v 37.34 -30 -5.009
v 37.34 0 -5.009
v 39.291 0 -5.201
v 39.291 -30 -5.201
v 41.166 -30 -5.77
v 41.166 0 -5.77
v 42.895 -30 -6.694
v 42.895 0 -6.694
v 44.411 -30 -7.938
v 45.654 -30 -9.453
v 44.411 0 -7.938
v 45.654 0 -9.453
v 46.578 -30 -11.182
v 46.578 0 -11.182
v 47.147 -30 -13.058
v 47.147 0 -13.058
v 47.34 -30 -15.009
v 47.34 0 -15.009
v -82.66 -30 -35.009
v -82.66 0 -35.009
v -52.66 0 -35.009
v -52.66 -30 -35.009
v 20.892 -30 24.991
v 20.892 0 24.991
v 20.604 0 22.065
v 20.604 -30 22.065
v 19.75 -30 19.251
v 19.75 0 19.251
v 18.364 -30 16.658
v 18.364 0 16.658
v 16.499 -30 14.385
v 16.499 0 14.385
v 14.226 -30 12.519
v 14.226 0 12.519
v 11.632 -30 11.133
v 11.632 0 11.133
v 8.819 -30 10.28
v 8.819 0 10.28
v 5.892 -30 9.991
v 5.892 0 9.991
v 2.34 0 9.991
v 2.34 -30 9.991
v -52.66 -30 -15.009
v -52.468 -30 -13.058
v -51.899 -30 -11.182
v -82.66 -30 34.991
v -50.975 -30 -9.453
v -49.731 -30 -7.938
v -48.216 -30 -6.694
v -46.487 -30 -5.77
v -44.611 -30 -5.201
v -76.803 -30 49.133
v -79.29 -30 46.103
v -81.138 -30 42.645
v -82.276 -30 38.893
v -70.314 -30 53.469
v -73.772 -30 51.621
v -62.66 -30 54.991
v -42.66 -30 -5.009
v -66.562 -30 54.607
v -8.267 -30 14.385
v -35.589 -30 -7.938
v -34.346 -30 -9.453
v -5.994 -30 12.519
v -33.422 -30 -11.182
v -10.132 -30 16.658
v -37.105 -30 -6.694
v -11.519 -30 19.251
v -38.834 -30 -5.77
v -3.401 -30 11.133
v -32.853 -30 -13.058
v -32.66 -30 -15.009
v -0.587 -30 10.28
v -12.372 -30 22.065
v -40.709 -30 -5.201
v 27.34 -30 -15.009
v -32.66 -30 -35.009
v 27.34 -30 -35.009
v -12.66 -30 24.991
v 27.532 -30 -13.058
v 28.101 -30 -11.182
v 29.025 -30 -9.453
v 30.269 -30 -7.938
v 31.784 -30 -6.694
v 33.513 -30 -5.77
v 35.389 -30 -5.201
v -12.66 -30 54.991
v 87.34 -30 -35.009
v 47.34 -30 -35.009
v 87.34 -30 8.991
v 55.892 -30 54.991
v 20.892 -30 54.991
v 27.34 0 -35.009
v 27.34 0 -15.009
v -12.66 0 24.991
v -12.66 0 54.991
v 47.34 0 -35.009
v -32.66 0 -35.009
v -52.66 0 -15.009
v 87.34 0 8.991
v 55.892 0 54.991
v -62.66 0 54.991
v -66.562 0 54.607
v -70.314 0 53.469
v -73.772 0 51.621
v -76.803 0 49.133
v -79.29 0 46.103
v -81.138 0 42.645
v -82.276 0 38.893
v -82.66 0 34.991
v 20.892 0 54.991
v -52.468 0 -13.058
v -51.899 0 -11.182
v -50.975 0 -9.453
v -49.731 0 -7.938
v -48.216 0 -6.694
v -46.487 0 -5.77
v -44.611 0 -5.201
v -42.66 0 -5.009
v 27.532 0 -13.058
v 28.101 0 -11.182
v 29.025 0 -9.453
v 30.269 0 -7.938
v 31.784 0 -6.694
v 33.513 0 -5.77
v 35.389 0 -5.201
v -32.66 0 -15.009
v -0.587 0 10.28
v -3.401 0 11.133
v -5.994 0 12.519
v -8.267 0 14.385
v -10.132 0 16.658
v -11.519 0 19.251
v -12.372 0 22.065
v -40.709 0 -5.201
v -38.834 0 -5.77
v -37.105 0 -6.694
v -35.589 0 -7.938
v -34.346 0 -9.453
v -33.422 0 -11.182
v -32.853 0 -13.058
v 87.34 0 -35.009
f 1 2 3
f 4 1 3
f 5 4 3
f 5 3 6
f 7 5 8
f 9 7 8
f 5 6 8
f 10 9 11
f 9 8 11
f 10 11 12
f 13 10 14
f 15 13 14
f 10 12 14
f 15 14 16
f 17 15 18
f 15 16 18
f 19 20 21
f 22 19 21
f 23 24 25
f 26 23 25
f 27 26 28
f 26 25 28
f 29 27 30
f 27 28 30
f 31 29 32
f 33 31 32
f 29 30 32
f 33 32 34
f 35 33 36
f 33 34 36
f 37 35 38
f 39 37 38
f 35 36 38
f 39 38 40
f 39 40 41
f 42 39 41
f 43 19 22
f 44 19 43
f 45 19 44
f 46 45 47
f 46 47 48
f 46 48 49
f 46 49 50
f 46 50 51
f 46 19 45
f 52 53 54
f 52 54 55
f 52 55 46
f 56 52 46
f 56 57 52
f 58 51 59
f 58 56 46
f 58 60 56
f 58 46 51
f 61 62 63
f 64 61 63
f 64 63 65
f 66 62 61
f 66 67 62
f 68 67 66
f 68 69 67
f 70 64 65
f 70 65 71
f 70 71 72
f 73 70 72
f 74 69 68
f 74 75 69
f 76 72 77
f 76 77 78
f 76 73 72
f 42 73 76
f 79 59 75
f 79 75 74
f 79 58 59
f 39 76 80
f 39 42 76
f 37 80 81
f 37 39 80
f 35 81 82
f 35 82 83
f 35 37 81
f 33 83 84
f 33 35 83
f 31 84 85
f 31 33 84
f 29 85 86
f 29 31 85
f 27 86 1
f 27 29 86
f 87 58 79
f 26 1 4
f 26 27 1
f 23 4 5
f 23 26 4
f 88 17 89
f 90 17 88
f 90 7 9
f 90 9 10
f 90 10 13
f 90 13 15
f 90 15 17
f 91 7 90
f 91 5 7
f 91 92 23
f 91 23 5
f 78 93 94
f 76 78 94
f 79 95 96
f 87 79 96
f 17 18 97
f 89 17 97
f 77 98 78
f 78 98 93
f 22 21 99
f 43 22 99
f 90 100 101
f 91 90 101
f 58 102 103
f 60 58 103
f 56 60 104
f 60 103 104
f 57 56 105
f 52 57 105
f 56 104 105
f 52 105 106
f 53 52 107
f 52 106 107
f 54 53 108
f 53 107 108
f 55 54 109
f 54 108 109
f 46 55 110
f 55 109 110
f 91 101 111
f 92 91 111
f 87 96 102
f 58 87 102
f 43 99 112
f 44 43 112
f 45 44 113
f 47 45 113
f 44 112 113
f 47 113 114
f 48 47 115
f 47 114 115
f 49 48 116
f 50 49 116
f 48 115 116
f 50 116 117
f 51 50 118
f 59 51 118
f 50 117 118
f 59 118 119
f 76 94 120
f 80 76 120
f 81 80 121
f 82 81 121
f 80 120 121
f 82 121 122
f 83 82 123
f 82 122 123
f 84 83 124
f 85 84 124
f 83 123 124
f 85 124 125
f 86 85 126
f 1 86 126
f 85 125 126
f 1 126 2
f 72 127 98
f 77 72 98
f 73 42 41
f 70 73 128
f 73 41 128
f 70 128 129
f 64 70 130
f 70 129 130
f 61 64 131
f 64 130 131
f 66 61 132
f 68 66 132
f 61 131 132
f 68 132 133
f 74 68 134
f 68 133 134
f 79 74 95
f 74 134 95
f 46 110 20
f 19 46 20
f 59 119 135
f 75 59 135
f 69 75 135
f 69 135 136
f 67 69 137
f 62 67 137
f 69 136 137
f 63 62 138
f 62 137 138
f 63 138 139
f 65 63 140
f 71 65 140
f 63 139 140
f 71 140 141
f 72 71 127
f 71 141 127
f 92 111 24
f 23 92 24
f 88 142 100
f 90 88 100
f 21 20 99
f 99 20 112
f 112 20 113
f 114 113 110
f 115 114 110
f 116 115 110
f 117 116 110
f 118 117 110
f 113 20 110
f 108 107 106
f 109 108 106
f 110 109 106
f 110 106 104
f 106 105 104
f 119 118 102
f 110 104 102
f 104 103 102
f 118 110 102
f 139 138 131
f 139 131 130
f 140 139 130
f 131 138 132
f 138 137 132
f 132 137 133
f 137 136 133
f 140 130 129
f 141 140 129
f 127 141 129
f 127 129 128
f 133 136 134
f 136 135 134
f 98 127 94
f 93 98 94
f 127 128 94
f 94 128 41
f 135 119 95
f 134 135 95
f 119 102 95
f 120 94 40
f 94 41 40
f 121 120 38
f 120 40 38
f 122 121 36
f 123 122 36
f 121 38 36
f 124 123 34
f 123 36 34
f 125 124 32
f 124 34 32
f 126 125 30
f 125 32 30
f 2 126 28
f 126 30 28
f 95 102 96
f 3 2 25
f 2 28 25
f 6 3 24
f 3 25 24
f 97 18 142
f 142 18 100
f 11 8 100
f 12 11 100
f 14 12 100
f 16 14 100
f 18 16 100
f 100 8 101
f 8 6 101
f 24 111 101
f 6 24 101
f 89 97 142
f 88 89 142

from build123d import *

# Parameters (mm, degrees)
F1_DEPTH = 30


with BuildPart() as f1:
    # F0 (on Front) → F1 (new body)
    with BuildSketch(Plane.XZ):
        with BuildLine():
            Line((-82.660393, 34.991289), (-82.660393, -35.008711))
            Line((-82.660393, -35.008711), (-52.660393, -35.008711))
            Line((-52.660393, -35.008711), (-52.660393, -15.008711))
            ThreePointArc((-52.660393, -15.008711), (-49.731461, -7.937643), (-42.660393, -5.008711))
            ThreePointArc((-42.660393, -5.008711), (-35.589325, -7.937643), (-32.660393, -15.008711))
            Line((-32.660393, -15.008711), (-32.660393, -35.008711))
            Line((-32.660393, -35.008711), (27.339607, -35.008711))
            Line((27.339607, -35.008711), (27.339607, -15.008711))
            ThreePointArc((27.339607, -15.008711), (30.268539, -7.937643), (37.339607, -5.008711))
            ThreePointArc((37.339607, -5.008711), (44.410675, -7.937643), (47.339607, -15.008711))
            Line((47.339607, -15.008711), (47.339607, -35.008711))
            Line((47.339607, -35.008711), (87.339607, -35.008711))
            Line((87.339607, -35.008711), (87.339607, 8.991289))
            Line((87.339607, 8.991289), (55.892236, 54.991289))
            Line((55.892236, 54.991289), (20.892236, 54.991289))
            Line((20.892236, 54.991289), (20.892236, 24.991289))
            ThreePointArc((20.892236, 24.991289), (16.498838, 14.384687), (5.892236, 9.991289))
            Line((5.892236, 9.991289), (2.339607, 9.991289))
            ThreePointArc((2.339607, 9.991289), (-8.266995, 14.384687), (-12.660393, 24.991289))
            Line((-12.660393, 24.991289), (-12.660393, 54.991289))
            Line((-12.660393, 54.991289), (-62.660393, 54.991289))
            ThreePointArc((-62.660393, 54.991289), (-76.802529, 49.133425), (-82.660393, 34.991289))
        make_face()
    extrude(amount=F1_DEPTH)


solid = f1.part
